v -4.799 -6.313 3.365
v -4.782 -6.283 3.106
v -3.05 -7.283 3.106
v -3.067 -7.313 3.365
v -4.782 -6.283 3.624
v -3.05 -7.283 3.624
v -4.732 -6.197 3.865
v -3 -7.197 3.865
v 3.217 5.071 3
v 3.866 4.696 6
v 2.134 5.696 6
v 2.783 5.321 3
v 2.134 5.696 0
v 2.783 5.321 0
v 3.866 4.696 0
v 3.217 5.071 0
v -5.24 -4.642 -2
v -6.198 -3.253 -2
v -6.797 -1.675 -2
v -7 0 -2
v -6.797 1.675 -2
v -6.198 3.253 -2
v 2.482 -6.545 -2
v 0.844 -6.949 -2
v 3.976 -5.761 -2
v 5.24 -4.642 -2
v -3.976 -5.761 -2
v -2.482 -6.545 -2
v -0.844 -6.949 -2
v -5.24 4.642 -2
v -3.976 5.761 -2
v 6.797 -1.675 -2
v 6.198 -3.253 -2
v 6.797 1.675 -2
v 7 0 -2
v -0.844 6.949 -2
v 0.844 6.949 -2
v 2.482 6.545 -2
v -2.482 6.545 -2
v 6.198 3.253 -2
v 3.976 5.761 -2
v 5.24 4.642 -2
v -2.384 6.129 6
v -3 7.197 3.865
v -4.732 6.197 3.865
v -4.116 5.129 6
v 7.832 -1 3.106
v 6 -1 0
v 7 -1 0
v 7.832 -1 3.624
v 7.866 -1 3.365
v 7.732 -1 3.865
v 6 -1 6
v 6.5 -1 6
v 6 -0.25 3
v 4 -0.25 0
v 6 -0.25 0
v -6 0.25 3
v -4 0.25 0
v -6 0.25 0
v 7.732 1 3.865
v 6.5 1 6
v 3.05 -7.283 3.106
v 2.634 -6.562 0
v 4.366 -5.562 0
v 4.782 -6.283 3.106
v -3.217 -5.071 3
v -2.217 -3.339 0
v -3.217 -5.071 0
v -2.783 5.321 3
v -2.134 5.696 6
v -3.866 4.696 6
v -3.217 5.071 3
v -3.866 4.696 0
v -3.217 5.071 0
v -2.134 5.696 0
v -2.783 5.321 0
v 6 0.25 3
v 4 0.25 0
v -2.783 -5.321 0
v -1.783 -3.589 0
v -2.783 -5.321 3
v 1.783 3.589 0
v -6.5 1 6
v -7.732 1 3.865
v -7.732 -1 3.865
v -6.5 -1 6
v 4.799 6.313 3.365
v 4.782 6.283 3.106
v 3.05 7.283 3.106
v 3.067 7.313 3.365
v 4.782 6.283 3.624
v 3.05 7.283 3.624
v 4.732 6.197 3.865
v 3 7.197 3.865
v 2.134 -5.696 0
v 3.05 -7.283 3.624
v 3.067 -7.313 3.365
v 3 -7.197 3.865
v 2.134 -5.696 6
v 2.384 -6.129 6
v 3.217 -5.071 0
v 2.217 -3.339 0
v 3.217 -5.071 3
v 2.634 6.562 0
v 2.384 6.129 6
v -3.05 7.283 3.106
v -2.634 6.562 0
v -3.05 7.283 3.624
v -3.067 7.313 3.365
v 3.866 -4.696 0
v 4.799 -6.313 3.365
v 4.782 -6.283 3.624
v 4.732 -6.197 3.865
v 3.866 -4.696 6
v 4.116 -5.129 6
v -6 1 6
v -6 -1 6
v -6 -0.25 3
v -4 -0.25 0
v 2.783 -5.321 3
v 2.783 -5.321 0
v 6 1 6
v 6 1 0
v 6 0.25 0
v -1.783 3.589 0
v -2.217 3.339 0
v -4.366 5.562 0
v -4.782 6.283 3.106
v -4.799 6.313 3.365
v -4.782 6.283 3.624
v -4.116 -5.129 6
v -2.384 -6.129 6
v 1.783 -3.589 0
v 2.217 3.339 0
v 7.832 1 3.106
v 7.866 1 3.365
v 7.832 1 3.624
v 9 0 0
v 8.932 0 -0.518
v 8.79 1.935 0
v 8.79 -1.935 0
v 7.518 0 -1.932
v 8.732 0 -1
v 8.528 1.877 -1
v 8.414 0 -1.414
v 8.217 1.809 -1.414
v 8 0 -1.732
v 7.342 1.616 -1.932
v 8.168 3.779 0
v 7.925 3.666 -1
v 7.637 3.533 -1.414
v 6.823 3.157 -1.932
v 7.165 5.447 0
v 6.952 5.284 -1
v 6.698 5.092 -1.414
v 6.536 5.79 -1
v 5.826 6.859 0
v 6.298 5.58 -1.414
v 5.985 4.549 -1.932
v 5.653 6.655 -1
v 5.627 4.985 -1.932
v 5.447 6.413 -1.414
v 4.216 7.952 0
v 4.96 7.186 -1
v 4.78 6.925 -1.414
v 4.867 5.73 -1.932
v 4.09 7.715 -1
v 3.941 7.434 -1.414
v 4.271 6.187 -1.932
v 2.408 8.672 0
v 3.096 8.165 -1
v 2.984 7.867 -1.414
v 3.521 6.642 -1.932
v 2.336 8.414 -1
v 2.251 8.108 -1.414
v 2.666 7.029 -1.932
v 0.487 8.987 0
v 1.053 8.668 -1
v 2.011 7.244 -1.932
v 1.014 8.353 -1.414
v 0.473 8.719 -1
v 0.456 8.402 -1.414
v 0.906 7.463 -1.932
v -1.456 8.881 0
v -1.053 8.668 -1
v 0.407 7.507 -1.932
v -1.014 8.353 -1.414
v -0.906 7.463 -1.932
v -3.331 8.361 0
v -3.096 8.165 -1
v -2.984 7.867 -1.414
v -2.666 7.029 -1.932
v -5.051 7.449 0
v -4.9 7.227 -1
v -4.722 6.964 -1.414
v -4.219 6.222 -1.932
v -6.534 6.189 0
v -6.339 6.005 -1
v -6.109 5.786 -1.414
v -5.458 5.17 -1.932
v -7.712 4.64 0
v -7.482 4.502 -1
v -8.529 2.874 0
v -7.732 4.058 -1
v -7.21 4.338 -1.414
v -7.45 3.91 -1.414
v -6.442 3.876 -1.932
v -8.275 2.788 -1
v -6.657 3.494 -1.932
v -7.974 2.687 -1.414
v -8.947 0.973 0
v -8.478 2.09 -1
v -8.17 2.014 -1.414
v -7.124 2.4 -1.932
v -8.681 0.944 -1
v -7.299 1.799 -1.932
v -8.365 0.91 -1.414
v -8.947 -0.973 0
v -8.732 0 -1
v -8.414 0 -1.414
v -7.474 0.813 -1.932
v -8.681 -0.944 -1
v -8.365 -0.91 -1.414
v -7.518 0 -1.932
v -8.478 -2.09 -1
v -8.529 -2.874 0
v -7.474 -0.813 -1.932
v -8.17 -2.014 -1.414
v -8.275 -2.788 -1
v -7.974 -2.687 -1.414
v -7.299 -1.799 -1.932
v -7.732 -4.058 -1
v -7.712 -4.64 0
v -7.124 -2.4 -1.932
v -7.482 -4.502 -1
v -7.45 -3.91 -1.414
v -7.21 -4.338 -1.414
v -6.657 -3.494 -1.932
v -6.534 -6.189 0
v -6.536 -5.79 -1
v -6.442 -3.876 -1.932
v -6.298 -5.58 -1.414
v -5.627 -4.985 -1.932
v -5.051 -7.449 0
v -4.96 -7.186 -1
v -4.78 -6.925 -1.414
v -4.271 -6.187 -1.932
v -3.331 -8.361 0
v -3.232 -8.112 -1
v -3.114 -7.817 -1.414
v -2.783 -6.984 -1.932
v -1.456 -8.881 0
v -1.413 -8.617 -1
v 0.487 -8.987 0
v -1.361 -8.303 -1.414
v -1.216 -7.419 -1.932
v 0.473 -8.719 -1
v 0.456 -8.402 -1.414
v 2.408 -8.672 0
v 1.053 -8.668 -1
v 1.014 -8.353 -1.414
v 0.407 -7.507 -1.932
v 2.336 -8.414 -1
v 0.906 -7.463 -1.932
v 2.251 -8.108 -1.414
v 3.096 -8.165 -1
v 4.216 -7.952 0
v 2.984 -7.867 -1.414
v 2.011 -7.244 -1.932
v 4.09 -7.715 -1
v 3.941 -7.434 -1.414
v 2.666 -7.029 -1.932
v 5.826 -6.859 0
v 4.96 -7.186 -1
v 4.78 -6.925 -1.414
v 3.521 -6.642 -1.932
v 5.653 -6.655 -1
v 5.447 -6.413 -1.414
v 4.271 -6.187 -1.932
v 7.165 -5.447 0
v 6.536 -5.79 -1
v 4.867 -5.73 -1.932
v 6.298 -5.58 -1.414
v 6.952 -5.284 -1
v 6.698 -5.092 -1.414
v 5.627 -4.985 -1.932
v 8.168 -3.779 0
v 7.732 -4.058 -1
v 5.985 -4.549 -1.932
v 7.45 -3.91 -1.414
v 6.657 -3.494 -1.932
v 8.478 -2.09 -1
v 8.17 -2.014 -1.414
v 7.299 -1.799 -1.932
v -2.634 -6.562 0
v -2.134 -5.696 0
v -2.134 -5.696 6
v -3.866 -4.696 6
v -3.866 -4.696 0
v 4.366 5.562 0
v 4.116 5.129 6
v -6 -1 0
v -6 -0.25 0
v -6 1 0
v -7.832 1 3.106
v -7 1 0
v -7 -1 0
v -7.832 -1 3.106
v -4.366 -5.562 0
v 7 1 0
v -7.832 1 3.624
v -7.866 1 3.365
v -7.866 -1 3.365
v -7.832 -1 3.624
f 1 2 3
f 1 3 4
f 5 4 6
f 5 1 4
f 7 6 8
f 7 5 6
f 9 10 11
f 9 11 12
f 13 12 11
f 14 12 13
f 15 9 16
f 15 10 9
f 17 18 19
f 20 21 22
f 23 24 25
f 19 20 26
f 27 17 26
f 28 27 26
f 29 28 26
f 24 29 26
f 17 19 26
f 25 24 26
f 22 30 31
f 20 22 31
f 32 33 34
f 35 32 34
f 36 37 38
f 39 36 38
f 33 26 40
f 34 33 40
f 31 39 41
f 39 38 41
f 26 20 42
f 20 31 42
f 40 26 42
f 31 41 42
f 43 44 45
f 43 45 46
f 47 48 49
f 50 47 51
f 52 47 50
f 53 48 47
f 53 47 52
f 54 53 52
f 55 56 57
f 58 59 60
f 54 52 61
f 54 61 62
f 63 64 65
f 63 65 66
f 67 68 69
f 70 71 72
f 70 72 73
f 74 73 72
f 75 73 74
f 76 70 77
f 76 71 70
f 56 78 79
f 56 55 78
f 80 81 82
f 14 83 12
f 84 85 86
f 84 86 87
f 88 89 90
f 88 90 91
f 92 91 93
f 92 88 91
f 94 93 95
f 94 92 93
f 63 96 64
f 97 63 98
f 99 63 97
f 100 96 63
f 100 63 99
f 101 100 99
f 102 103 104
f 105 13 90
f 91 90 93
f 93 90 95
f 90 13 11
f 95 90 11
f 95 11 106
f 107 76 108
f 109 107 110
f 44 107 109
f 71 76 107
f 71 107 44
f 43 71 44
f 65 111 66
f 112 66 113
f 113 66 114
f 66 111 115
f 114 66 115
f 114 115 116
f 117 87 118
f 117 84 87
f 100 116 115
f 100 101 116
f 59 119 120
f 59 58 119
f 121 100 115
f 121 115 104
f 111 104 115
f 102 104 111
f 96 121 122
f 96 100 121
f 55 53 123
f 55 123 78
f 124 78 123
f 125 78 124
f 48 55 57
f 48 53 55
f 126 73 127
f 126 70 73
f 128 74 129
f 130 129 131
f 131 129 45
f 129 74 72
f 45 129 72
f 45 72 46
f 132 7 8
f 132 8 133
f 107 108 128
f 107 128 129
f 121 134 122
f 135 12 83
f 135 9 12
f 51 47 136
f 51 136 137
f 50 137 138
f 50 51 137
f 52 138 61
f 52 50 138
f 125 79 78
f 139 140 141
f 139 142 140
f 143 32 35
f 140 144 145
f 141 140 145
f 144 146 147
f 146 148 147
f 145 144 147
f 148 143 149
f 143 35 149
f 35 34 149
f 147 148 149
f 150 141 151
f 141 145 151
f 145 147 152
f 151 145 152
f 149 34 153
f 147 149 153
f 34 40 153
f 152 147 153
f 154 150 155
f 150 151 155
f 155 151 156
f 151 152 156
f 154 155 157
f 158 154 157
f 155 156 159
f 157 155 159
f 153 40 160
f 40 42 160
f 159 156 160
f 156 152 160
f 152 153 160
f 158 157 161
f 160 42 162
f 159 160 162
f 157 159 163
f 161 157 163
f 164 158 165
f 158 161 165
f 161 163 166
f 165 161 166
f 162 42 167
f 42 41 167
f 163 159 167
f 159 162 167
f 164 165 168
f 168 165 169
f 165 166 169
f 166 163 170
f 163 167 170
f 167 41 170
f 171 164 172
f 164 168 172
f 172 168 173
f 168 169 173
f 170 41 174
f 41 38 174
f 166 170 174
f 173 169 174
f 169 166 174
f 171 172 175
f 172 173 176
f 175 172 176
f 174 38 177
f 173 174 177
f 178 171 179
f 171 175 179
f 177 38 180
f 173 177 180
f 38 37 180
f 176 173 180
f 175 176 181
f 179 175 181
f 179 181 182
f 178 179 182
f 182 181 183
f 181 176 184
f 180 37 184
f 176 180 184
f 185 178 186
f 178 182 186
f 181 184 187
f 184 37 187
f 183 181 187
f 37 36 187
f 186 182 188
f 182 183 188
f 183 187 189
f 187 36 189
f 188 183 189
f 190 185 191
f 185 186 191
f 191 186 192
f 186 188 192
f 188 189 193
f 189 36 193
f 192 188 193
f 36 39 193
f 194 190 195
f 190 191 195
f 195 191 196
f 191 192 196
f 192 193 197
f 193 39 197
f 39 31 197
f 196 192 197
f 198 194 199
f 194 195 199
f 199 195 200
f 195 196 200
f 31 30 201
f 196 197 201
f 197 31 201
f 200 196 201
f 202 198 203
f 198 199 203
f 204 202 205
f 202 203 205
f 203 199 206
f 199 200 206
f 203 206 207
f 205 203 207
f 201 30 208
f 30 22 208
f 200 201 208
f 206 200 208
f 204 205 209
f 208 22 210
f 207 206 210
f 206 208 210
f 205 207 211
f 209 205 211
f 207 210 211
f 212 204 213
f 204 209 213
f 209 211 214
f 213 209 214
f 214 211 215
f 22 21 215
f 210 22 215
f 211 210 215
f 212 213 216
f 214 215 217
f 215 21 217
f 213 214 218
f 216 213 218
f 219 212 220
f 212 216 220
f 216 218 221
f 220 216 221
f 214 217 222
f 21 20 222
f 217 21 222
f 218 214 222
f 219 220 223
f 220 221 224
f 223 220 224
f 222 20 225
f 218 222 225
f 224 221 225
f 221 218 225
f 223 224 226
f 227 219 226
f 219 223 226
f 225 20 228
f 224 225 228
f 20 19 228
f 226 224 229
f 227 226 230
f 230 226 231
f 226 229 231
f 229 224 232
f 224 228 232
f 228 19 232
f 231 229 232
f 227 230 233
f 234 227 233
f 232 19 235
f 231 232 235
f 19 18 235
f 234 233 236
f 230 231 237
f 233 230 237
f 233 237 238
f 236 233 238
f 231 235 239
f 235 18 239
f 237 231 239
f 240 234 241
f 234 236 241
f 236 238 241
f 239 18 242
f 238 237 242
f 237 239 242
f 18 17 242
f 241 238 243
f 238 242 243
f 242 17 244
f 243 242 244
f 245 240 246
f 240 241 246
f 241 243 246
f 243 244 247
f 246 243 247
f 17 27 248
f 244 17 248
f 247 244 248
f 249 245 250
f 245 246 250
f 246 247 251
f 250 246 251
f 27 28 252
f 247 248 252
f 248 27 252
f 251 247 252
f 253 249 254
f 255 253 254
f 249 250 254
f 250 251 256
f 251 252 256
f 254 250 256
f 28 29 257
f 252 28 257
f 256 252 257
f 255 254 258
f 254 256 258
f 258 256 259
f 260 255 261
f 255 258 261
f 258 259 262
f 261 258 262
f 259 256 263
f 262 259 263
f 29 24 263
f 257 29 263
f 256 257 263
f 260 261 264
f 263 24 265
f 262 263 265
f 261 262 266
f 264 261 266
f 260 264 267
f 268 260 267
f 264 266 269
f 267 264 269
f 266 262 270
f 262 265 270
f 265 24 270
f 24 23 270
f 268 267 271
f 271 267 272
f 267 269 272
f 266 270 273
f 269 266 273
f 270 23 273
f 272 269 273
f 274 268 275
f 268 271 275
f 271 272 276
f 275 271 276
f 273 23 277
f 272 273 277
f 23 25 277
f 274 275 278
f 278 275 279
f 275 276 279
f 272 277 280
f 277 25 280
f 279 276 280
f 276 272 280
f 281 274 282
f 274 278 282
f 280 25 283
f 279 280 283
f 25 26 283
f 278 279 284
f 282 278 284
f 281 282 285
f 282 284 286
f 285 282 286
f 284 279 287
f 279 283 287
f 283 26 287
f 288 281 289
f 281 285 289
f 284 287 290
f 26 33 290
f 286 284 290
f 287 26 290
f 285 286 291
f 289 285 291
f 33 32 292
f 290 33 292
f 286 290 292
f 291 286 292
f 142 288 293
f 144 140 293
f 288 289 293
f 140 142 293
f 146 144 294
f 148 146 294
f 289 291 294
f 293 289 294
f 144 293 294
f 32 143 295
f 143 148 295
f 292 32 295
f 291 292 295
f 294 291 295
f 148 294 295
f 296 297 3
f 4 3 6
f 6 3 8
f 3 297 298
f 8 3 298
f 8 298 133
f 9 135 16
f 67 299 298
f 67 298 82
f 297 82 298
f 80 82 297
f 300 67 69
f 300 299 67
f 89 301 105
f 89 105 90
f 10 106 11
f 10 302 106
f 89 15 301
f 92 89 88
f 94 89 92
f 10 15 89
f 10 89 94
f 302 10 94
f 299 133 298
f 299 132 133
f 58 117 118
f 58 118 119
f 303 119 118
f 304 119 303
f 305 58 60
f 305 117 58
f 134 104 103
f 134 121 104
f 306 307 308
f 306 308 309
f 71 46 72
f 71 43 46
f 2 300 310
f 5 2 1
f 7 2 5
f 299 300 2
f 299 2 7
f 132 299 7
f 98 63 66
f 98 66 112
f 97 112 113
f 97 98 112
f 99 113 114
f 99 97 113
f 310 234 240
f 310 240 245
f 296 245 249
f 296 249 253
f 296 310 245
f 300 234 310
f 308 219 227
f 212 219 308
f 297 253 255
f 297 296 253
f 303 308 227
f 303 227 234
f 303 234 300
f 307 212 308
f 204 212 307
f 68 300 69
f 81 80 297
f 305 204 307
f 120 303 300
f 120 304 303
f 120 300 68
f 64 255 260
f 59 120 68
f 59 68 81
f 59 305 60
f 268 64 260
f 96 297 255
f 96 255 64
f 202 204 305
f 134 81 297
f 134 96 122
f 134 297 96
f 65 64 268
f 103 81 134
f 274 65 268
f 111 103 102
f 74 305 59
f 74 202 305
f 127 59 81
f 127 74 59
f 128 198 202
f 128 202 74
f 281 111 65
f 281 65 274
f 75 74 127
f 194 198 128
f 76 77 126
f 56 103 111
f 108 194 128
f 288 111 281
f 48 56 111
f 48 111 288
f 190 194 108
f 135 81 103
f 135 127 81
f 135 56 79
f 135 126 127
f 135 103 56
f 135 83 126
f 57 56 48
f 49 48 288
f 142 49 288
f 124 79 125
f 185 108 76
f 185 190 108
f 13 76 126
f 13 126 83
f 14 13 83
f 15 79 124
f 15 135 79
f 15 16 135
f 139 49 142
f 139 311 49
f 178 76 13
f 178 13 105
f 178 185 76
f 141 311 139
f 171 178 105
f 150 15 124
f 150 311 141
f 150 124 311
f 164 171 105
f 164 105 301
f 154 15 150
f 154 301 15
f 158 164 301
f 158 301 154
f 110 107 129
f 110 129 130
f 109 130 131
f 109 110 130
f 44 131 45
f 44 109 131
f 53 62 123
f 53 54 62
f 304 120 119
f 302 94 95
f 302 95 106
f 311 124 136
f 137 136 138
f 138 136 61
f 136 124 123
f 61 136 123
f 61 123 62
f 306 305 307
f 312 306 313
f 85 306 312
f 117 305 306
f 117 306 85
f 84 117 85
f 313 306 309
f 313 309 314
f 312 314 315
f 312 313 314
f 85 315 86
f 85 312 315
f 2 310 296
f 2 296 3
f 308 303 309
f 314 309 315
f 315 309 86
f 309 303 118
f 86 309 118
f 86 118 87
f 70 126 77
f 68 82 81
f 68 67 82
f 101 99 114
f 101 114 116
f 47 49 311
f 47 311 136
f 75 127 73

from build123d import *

# Parameters (mm, degrees)
F1_DEPTH        = 1
F1_COPIES_COUNT = 6
F2_DEPTH        = 0.25
F2_COPIES_COUNT = 6
F3_R            = 9
F4_DEPTH        = 2
F5_R            = 1.99999


# Not quite as in the source:
# - a fillet or chamfer is up to 0.001 mm smaller than in the source, because OpenCascade refuses the exact size
# - a pattern or mirror of a feature is missing from the dataset's text; its kind, count and spacing are read off the source's solid


with BuildPart() as f1:
    # F0 (on Front) → F1 (new body, symmetric)
    with BuildSketch(Plane.XZ):
        with BuildLine():
            Line((6, 3), (6, 0))
            Line((6, 0), (7, 0))
            Line((7, 0), (7.8323762036, 3.1064702829))
            ThreePointArc((7.8323762036, 3.1064702829), (7.8578952387, 3.4958155202), (7.7324757811, 3.865289328))
            Line((7.7324757811, 3.865289328), (6.5, 6))
            Line((6.5, 6), (6, 6))
            Line((6, 6), (6, 3))
        make_face()
    extrude(amount=F1_DEPTH, both=True)


with BuildPart() as f1_copies_1:
    # F1_copies: instance of F1
    add(f1.part.rotate(Axis((0, 0, 0), (0, 0, 1)), 1 * 360 / F1_COPIES_COUNT))


with BuildPart() as f1_copies_2:
    # F1_copies: instance of F1
    add(f1.part.rotate(Axis((0, 0, 0), (0, 0, 1)), 2 * 360 / F1_COPIES_COUNT))


with BuildPart() as f1_copies_3:
    # F1_copies: instance of F1
    add(f1.part.rotate(Axis((0, 0, 0), (0, 0, 1)), 3 * 360 / F1_COPIES_COUNT))


with BuildPart() as f1_copies_4:
    # F1_copies: instance of F1
    add(f1.part.rotate(Axis((0, 0, 0), (0, 0, 1)), 4 * 360 / F1_COPIES_COUNT))


with BuildPart() as f1_copies_5:
    # F1_copies: instance of F1
    add(f1.part.rotate(Axis((0, 0, 0), (0, 0, 1)), 5 * 360 / F1_COPIES_COUNT))


with BuildPart() as f1_1:
    add(f1.part)

    # F0 (on Front) → F2 (join, symmetric)
    with BuildSketch(Plane.XZ):
        Polygon((6, 3), (4, 0), (6, 0), align=None)
    f2 = extrude(amount=F2_DEPTH, both=True)

    # F2_copies: F2 ×6 about axis
    f2_copies_axis = Axis((0, 0, 0), (0, 0, 1))
    for i in range(1, F2_COPIES_COUNT):
        add(f2.rotate(f2_copies_axis, i * 360 / F2_COPIES_COUNT))

    add(f1_copies_1.part)  # F4 merges F1_copies_1

    add(f1_copies_2.part)  # F4 merges F1_copies_2

    add(f1_copies_3.part)  # F4 merges F1_copies_3

    add(f1_copies_4.part)  # F4 merges F1_copies_4

    add(f1_copies_5.part)  # F4 merges F1_copies_5
    # F3 (on Top) → F4 (join)
    with BuildSketch(Plane.XY):
        Circle(F3_R)
    extrude(amount=-F4_DEPTH)

    # F5 (radius 2 in the source; OpenCascade refuses exactly that, so slightly less here)
    f5_edges = [f1_1.edges().sort_by_distance(p)[0] for p in [
        (-9, 0, -2),
    ]]
    fillet(f5_edges, radius=F5_R)


solid = f1_1.part
